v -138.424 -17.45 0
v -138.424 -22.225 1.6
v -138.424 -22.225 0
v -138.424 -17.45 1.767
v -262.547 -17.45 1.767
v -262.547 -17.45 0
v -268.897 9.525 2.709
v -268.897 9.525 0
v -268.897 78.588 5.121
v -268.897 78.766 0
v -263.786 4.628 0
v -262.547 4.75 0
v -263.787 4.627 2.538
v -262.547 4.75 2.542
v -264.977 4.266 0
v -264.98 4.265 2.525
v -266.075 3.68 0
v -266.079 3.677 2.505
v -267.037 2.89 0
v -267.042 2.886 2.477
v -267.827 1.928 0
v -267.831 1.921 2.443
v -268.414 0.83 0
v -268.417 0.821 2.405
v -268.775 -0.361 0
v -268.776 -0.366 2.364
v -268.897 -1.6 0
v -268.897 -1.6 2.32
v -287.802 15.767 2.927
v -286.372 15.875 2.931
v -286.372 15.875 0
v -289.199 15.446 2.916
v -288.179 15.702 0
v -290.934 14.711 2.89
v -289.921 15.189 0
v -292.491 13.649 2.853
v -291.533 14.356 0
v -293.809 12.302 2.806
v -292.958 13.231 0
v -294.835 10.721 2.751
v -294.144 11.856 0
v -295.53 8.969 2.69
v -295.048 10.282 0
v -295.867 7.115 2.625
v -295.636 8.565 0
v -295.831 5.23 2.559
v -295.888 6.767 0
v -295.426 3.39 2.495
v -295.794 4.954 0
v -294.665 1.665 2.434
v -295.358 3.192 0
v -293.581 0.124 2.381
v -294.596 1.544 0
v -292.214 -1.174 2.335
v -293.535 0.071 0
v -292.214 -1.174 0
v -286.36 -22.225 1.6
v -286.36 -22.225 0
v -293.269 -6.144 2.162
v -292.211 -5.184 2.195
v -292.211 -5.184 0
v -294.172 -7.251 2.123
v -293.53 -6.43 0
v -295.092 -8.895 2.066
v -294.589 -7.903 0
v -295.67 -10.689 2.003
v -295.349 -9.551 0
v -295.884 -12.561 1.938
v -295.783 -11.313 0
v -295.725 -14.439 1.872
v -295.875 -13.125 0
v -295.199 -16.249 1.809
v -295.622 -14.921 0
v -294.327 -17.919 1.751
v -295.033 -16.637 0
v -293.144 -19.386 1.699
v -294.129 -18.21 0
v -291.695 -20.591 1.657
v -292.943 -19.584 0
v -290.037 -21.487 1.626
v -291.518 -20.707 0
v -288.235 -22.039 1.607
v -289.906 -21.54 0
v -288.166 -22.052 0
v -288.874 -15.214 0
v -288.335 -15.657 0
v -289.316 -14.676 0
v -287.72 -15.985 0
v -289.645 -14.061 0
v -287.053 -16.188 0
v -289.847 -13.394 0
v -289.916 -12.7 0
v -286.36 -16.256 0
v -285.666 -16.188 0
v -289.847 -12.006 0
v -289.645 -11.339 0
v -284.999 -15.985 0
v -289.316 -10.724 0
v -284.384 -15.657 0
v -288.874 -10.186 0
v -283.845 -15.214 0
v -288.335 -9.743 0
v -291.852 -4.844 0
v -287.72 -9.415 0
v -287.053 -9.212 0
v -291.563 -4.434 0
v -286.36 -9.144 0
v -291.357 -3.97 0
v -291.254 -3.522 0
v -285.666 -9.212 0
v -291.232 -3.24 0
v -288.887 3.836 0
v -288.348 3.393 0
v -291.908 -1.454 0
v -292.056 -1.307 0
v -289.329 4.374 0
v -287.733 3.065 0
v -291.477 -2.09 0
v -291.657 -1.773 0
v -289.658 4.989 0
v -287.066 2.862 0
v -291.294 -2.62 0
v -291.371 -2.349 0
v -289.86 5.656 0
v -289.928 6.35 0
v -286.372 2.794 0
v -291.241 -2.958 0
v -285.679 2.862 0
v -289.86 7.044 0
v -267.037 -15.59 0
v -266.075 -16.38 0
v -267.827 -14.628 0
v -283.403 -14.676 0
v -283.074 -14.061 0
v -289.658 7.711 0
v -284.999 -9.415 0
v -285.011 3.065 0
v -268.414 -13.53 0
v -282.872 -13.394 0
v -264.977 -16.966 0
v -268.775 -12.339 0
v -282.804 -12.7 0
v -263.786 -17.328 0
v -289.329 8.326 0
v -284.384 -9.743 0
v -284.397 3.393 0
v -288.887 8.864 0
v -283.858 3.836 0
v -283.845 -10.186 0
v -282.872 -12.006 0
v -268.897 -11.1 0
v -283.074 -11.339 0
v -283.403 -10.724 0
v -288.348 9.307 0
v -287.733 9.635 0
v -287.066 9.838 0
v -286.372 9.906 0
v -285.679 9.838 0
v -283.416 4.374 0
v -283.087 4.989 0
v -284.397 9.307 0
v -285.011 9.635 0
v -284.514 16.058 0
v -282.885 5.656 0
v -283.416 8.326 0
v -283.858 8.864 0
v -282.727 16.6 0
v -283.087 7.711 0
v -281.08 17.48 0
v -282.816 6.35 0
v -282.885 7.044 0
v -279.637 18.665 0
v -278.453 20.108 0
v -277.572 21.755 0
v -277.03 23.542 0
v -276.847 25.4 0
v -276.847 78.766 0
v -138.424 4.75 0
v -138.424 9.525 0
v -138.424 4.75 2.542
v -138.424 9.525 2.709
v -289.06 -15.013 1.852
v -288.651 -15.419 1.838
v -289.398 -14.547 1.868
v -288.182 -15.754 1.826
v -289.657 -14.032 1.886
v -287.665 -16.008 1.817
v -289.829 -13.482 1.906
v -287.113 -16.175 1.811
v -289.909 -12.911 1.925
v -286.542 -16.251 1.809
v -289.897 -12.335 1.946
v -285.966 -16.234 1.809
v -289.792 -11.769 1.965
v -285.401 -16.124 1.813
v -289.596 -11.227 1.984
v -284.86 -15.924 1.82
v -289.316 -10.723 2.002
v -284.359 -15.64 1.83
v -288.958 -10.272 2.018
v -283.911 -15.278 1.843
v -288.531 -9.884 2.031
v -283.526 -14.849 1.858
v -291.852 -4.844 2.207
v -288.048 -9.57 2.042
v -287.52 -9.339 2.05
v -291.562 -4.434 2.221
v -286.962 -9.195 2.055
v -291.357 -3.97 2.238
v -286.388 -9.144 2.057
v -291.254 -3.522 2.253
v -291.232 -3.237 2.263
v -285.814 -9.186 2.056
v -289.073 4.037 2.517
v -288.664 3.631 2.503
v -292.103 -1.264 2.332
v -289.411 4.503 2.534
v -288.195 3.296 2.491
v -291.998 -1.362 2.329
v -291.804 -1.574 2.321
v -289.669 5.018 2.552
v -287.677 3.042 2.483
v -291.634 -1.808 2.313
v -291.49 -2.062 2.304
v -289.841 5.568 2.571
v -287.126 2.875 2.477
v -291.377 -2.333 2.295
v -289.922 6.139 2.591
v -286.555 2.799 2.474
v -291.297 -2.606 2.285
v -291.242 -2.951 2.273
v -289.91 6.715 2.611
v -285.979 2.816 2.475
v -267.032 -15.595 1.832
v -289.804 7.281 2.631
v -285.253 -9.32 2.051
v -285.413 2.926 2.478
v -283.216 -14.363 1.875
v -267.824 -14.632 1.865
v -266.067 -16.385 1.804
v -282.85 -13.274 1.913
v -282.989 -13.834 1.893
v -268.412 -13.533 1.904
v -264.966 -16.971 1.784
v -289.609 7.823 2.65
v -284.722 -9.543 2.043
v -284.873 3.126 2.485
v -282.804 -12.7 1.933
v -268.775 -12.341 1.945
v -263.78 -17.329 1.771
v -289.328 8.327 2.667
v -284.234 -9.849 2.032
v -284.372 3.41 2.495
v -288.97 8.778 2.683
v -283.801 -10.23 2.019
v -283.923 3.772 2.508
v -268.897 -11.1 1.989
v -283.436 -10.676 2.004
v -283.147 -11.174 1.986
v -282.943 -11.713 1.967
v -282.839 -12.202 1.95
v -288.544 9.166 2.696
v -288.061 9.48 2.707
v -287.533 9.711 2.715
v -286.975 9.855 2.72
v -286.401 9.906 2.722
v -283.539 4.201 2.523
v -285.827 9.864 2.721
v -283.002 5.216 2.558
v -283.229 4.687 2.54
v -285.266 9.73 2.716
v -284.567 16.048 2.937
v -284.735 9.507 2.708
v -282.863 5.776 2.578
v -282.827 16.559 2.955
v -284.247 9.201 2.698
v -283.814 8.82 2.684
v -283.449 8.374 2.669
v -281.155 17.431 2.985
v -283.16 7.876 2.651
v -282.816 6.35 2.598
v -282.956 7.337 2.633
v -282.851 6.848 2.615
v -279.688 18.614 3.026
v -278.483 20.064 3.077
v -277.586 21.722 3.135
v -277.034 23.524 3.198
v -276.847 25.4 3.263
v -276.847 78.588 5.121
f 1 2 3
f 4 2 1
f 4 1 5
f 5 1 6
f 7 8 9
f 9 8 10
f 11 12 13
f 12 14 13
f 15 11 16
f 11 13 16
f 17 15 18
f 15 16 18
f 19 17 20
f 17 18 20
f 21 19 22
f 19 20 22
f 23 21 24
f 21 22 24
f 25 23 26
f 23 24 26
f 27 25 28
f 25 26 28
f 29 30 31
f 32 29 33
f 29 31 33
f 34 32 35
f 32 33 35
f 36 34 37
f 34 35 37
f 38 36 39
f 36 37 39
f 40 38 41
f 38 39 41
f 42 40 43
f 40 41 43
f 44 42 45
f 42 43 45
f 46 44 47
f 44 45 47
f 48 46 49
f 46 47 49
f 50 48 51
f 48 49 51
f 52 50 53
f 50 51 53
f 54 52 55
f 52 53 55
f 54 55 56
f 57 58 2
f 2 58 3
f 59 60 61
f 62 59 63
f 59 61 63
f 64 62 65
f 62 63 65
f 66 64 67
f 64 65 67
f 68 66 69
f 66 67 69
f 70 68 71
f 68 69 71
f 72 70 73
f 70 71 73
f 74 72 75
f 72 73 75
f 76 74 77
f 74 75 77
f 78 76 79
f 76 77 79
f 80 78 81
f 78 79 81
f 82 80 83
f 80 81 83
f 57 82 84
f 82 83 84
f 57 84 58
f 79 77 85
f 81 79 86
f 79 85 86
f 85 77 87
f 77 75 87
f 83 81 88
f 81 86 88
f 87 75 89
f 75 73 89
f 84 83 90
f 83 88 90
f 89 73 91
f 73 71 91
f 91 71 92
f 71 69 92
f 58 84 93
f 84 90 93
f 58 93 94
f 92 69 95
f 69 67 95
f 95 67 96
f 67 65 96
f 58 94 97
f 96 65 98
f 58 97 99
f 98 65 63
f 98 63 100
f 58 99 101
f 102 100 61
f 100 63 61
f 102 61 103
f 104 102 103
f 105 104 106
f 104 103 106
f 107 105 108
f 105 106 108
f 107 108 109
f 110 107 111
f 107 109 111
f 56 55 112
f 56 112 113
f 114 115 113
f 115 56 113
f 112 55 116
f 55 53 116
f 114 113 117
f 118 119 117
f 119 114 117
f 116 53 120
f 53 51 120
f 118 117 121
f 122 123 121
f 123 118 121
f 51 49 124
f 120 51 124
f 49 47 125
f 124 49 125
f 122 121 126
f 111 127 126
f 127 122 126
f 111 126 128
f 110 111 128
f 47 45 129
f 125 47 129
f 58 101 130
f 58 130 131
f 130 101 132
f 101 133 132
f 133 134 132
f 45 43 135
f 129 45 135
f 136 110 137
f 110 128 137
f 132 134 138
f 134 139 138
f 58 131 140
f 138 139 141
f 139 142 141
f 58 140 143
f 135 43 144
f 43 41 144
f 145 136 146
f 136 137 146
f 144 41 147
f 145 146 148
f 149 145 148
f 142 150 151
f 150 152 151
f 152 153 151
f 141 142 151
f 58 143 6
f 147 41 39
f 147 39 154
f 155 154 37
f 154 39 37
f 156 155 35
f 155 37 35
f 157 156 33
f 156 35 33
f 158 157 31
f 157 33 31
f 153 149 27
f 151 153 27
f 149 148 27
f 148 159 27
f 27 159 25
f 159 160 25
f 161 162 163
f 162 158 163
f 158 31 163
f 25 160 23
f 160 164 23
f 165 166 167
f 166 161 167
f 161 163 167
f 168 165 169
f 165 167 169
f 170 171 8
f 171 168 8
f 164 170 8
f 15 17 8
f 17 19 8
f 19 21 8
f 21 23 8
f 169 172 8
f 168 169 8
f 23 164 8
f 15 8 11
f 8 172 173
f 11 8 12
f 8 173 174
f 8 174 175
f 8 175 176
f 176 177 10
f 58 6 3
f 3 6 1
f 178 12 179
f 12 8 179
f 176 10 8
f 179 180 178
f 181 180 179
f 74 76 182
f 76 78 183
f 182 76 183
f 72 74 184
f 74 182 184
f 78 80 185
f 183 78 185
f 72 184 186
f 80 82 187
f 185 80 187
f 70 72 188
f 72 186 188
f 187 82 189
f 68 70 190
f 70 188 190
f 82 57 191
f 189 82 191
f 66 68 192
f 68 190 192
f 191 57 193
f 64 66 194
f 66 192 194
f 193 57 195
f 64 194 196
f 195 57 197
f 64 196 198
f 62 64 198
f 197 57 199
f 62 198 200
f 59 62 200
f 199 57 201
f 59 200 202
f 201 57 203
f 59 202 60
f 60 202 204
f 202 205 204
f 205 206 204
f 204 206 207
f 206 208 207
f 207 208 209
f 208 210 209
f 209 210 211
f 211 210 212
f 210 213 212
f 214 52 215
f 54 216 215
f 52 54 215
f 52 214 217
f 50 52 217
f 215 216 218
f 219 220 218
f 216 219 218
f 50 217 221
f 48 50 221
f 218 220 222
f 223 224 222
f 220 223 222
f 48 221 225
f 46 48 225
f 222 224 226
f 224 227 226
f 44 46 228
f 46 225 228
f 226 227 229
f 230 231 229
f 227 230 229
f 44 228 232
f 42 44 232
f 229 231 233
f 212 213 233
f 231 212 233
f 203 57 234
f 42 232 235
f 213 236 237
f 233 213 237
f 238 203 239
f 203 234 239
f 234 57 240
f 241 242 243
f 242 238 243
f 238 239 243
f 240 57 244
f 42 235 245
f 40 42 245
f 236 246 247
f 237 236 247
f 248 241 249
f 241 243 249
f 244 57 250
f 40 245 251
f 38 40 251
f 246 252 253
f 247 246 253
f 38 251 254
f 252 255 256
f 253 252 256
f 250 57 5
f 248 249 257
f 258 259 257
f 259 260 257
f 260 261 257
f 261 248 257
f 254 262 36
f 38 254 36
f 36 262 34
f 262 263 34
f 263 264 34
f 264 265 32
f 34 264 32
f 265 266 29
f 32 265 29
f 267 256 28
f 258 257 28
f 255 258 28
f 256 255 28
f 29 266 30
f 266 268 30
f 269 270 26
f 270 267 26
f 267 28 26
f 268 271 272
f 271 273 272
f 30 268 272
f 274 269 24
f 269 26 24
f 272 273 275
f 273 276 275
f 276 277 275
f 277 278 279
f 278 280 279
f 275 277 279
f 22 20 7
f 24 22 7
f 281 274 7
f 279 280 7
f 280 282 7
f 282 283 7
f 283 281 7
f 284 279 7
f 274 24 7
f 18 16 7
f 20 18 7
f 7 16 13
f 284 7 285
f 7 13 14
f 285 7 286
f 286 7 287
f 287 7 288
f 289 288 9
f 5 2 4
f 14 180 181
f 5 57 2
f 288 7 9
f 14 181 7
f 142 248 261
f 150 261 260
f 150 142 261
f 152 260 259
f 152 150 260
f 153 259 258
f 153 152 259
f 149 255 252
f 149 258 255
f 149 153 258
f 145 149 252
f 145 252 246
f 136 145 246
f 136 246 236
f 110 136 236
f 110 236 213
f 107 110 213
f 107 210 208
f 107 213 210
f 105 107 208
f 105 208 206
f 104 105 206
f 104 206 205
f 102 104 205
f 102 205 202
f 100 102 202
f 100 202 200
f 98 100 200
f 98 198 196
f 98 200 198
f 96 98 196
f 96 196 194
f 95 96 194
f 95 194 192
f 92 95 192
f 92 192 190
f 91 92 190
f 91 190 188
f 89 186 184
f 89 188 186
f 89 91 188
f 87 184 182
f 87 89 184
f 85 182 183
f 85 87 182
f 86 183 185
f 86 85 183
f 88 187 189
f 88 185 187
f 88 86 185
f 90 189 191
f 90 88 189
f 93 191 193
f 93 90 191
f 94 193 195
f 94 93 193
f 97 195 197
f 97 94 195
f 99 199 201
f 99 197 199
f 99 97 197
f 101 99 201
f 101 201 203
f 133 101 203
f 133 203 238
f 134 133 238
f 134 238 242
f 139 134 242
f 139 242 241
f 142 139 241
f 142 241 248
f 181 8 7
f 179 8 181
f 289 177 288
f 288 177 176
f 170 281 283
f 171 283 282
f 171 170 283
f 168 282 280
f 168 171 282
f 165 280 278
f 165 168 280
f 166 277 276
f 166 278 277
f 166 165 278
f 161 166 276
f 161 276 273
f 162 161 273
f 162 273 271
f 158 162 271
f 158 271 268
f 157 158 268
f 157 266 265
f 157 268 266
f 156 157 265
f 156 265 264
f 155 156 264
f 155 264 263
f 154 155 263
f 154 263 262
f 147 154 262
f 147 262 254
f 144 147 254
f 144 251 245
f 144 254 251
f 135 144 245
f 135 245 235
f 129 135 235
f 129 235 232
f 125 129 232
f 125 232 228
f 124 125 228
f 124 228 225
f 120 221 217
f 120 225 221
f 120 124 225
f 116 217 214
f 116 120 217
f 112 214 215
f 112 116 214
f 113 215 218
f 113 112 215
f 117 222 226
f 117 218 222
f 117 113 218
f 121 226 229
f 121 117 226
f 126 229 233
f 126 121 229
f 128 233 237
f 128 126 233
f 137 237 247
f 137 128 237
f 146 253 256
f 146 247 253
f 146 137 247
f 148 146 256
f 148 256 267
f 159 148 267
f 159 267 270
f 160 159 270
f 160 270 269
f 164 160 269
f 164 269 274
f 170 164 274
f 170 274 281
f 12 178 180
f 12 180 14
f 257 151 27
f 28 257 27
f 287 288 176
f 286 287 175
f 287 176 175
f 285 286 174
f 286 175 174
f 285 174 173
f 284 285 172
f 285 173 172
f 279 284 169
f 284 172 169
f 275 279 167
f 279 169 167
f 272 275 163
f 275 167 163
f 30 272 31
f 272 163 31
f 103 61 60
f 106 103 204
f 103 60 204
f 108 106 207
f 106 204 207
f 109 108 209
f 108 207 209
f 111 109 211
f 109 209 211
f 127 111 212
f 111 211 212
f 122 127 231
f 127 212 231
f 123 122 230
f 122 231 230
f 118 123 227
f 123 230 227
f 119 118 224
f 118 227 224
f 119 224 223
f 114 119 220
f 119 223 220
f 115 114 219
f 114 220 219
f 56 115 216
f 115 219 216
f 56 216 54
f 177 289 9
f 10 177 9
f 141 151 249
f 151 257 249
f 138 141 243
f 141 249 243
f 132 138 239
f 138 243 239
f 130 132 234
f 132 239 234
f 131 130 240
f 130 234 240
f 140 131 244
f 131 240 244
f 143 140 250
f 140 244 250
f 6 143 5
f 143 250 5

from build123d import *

# Parameters (mm, degrees)
BOSS_EXTRUDE1_OUTLINE_R = 3.556
BOSS_EXTRUDE1_OUTLINE_W = 260.9469
BOSS_EXTRUDE1_OUTLINE_H = 138.1252
BOSS_EXTRUDE1_DEPTH     = 76.2
CUT_EXTRUDE1_DEPTH      = 355.32482824
CUT_EXTRUDE1_DEPTH_BACK = 355.32482824
FILLET1_R               = 2.54
SKETCH7_W               = 260.9469
SKETCH7_H               = 22.1996
CUT_EXTRUDE2_DEPTH      = 347.152897849
FILLET2_R               = 6.35
SKETCH8_W               = 217.439036591
SKETCH8_H               = 235.521960295
CUT_EXTRUDE4_DEPTH      = 347.144751077
SKETCH9_W               = 205.813387363
SKETCH9_H               = 113.418104201
CUT_EXTRUDE5_DEPTH      = 347.144751077


# Read off the part's stored shape, not the designer's step: Boss-Extrude1
with BuildPart() as part:
    # Boss-Extrude1 outline → Boss-Extrude1 (new body)
    with BuildSketch(Plane.XY):
        with BuildLine():
            Line((-286.3596, -22.225), (9.525, -22.225))
            ThreePointArc((9.525, -22.225), (19.05, -12.7), (9.525, -3.175))
            ThreePointArc((9.525, -3.175), (19.05, 6.35), (9.525, 15.875))
            ThreePointArc((9.525, 15.875), (2.789807909, 18.664807909), (0, 25.4))
            Line((0, 25.4), (0, 131.7752))
            ThreePointArc((0, 131.7752), (2.789807909, 138.510392091), (9.525, 141.3002))
            ThreePointArc((9.525, 141.3002), (19.05, 150.8252), (9.525, 160.3502))
            ThreePointArc((9.525, 160.3502), (19.05, 169.8752), (9.525, 179.4002))
            Line((9.525, 179.4002), (-6.35, 179.4002))
            Line((-6.35, 179.4002), (-6.35, 163.5252))
            Line((-6.35, 163.5252), (-7.9502, 163.5252))
            Line((-7.9502, 163.5252), (-7.9502, 160.3502))
            Line((-7.9502, 160.3502), (-268.9098, 160.3502))
            Line((-268.9098, 160.3502), (-268.9098, 163.5252))
            Line((-268.9098, 163.5252), (-270.51, 163.5252))
            Line((-270.51, 163.5252), (-270.51, 179.4002))
            Line((-270.51, 179.4002), (-286.385, 179.4002))
            ThreePointArc((-286.385, 179.4002), (-295.91, 169.8752), (-286.385, 160.3502))
            ThreePointArc((-286.385, 160.3502), (-295.897297883, 150.818850004), (-286.3723, 141.3002))
            ThreePointArc((-286.3723, 141.3002), (-279.637107909, 138.510392091), (-276.8473, 131.7752))
            Line((-276.8473, 131.7752), (-276.8473, 25.4))
            ThreePointArc((-276.8473, 25.4), (-279.637107909, 18.664807909), (-286.3723, 15.875))
            ThreePointArc((-286.3723, 15.875), (-295.8973, 6.35), (-286.3723, -3.175))
            ThreePointArc((-286.3723, -3.175), (-295.884597883, -12.706349996), (-286.3596, -22.225))
        make_face()
        with Locations((-286.3596, -12.7)):
            Circle(BOSS_EXTRUDE1_OUTLINE_R, mode=Mode.SUBTRACT)
        with Locations((-286.3723, 6.35)):
            Circle(BOSS_EXTRUDE1_OUTLINE_R, mode=Mode.SUBTRACT)
        with Locations((9.525, -12.7)):
            Circle(BOSS_EXTRUDE1_OUTLINE_R, mode=Mode.SUBTRACT)
        with Locations((9.525, 6.35)):
            Circle(BOSS_EXTRUDE1_OUTLINE_R, mode=Mode.SUBTRACT)
        with Locations((-286.3723, 150.8252)):
            Circle(BOSS_EXTRUDE1_OUTLINE_R, mode=Mode.SUBTRACT)
        with Locations((-286.385, 169.8752)):
            Circle(BOSS_EXTRUDE1_OUTLINE_R, mode=Mode.SUBTRACT)
        with Locations((-138.42365, 78.5876)):
            Rectangle(BOSS_EXTRUDE1_OUTLINE_W, BOSS_EXTRUDE1_OUTLINE_H, mode=Mode.SUBTRACT)
        with Locations((9.525, 150.8252)):
            Circle(BOSS_EXTRUDE1_OUTLINE_R, mode=Mode.SUBTRACT)
        with Locations((9.525, 169.8752)):
            Circle(BOSS_EXTRUDE1_OUTLINE_R, mode=Mode.SUBTRACT)
    extrude(amount=BOSS_EXTRUDE1_DEPTH)

    # Sketch5 → Cut-Extrude1 (cut, two sides: drawn at the far end of the back side and taken through both)
    with BuildSketch(Plane.ZY.offset(276.8473).offset(-CUT_EXTRUDE1_DEPTH_BACK)):
        Polygon((1.6002, -22.225), (8.641107133, 179.4002), (76.2, 179.4002), (76.2, -22.225), align=None)
    extrude(amount=CUT_EXTRUDE1_DEPTH + CUT_EXTRUDE1_DEPTH_BACK, mode=Mode.SUBTRACT)

    # Fillet1
    fillet1_edges = [part.edges().sort_by_distance(p)[0] for p in [
        (-286.385, 160.3502, 3.987933237),
        (-286.3723, -3.175, 1.132720329),
        (9.525, -3.175, 1.132720329),
        (9.525, 160.3502, 3.987933237),
    ]]
    fillet(fillet1_edges, radius=FILLET1_R)

    # Sketch7 → Cut-Extrude2 (cut, through all)
    with BuildSketch(Plane(origin=(0, 0, 0), x_dir=(-1, 0, 0), z_dir=(0, 0, -1))):
        with Locations((138.42365, -6.35)):
            Rectangle(SKETCH7_W, SKETCH7_H)
    extrude(amount=-CUT_EXTRUDE2_DEPTH, mode=Mode.SUBTRACT)

    # Fillet2
    fillet2_edges = [part.edges().sort_by_distance(p)[0] for p in [
        (-268.8971, 4.7498, 1.271090386),
        (-268.8971, -17.4498, 0.883476829),
        (-7.9502, -17.4498, 0.883476829),
        (-7.9502, 4.7498, 1.271090386),
    ]]
    fillet(fillet2_edges, radius=FILLET2_R)

    # Sketch8 → Cut-Extrude4 (cut, through all)
    with BuildSketch(Plane(origin=(0, -0.082881646, 2.373419811), x_dir=(1, 0, 0), z_dir=(0, -0.03489949670250444, 0.9993908270190958))):
        with Locations((-29.704131704, 74.917246318)):
            Rectangle(SKETCH8_W, SKETCH8_H)
    extrude(amount=-CUT_EXTRUDE4_DEPTH, mode=Mode.SUBTRACT)

    # Sketch9 → Cut-Extrude5 (cut, through all)
    with BuildSketch(Plane(origin=(0, -0.082881646, 2.373419811), x_dir=(1, 0, 0), z_dir=(0, -0.03489949670250444, 0.9993908270190958))):
        with Locations((-241.330343682, 135.427486891)):
            Rectangle(SKETCH9_W, SKETCH9_H)
    extrude(amount=-CUT_EXTRUDE5_DEPTH, mode=Mode.SUBTRACT)


solid = part.part
